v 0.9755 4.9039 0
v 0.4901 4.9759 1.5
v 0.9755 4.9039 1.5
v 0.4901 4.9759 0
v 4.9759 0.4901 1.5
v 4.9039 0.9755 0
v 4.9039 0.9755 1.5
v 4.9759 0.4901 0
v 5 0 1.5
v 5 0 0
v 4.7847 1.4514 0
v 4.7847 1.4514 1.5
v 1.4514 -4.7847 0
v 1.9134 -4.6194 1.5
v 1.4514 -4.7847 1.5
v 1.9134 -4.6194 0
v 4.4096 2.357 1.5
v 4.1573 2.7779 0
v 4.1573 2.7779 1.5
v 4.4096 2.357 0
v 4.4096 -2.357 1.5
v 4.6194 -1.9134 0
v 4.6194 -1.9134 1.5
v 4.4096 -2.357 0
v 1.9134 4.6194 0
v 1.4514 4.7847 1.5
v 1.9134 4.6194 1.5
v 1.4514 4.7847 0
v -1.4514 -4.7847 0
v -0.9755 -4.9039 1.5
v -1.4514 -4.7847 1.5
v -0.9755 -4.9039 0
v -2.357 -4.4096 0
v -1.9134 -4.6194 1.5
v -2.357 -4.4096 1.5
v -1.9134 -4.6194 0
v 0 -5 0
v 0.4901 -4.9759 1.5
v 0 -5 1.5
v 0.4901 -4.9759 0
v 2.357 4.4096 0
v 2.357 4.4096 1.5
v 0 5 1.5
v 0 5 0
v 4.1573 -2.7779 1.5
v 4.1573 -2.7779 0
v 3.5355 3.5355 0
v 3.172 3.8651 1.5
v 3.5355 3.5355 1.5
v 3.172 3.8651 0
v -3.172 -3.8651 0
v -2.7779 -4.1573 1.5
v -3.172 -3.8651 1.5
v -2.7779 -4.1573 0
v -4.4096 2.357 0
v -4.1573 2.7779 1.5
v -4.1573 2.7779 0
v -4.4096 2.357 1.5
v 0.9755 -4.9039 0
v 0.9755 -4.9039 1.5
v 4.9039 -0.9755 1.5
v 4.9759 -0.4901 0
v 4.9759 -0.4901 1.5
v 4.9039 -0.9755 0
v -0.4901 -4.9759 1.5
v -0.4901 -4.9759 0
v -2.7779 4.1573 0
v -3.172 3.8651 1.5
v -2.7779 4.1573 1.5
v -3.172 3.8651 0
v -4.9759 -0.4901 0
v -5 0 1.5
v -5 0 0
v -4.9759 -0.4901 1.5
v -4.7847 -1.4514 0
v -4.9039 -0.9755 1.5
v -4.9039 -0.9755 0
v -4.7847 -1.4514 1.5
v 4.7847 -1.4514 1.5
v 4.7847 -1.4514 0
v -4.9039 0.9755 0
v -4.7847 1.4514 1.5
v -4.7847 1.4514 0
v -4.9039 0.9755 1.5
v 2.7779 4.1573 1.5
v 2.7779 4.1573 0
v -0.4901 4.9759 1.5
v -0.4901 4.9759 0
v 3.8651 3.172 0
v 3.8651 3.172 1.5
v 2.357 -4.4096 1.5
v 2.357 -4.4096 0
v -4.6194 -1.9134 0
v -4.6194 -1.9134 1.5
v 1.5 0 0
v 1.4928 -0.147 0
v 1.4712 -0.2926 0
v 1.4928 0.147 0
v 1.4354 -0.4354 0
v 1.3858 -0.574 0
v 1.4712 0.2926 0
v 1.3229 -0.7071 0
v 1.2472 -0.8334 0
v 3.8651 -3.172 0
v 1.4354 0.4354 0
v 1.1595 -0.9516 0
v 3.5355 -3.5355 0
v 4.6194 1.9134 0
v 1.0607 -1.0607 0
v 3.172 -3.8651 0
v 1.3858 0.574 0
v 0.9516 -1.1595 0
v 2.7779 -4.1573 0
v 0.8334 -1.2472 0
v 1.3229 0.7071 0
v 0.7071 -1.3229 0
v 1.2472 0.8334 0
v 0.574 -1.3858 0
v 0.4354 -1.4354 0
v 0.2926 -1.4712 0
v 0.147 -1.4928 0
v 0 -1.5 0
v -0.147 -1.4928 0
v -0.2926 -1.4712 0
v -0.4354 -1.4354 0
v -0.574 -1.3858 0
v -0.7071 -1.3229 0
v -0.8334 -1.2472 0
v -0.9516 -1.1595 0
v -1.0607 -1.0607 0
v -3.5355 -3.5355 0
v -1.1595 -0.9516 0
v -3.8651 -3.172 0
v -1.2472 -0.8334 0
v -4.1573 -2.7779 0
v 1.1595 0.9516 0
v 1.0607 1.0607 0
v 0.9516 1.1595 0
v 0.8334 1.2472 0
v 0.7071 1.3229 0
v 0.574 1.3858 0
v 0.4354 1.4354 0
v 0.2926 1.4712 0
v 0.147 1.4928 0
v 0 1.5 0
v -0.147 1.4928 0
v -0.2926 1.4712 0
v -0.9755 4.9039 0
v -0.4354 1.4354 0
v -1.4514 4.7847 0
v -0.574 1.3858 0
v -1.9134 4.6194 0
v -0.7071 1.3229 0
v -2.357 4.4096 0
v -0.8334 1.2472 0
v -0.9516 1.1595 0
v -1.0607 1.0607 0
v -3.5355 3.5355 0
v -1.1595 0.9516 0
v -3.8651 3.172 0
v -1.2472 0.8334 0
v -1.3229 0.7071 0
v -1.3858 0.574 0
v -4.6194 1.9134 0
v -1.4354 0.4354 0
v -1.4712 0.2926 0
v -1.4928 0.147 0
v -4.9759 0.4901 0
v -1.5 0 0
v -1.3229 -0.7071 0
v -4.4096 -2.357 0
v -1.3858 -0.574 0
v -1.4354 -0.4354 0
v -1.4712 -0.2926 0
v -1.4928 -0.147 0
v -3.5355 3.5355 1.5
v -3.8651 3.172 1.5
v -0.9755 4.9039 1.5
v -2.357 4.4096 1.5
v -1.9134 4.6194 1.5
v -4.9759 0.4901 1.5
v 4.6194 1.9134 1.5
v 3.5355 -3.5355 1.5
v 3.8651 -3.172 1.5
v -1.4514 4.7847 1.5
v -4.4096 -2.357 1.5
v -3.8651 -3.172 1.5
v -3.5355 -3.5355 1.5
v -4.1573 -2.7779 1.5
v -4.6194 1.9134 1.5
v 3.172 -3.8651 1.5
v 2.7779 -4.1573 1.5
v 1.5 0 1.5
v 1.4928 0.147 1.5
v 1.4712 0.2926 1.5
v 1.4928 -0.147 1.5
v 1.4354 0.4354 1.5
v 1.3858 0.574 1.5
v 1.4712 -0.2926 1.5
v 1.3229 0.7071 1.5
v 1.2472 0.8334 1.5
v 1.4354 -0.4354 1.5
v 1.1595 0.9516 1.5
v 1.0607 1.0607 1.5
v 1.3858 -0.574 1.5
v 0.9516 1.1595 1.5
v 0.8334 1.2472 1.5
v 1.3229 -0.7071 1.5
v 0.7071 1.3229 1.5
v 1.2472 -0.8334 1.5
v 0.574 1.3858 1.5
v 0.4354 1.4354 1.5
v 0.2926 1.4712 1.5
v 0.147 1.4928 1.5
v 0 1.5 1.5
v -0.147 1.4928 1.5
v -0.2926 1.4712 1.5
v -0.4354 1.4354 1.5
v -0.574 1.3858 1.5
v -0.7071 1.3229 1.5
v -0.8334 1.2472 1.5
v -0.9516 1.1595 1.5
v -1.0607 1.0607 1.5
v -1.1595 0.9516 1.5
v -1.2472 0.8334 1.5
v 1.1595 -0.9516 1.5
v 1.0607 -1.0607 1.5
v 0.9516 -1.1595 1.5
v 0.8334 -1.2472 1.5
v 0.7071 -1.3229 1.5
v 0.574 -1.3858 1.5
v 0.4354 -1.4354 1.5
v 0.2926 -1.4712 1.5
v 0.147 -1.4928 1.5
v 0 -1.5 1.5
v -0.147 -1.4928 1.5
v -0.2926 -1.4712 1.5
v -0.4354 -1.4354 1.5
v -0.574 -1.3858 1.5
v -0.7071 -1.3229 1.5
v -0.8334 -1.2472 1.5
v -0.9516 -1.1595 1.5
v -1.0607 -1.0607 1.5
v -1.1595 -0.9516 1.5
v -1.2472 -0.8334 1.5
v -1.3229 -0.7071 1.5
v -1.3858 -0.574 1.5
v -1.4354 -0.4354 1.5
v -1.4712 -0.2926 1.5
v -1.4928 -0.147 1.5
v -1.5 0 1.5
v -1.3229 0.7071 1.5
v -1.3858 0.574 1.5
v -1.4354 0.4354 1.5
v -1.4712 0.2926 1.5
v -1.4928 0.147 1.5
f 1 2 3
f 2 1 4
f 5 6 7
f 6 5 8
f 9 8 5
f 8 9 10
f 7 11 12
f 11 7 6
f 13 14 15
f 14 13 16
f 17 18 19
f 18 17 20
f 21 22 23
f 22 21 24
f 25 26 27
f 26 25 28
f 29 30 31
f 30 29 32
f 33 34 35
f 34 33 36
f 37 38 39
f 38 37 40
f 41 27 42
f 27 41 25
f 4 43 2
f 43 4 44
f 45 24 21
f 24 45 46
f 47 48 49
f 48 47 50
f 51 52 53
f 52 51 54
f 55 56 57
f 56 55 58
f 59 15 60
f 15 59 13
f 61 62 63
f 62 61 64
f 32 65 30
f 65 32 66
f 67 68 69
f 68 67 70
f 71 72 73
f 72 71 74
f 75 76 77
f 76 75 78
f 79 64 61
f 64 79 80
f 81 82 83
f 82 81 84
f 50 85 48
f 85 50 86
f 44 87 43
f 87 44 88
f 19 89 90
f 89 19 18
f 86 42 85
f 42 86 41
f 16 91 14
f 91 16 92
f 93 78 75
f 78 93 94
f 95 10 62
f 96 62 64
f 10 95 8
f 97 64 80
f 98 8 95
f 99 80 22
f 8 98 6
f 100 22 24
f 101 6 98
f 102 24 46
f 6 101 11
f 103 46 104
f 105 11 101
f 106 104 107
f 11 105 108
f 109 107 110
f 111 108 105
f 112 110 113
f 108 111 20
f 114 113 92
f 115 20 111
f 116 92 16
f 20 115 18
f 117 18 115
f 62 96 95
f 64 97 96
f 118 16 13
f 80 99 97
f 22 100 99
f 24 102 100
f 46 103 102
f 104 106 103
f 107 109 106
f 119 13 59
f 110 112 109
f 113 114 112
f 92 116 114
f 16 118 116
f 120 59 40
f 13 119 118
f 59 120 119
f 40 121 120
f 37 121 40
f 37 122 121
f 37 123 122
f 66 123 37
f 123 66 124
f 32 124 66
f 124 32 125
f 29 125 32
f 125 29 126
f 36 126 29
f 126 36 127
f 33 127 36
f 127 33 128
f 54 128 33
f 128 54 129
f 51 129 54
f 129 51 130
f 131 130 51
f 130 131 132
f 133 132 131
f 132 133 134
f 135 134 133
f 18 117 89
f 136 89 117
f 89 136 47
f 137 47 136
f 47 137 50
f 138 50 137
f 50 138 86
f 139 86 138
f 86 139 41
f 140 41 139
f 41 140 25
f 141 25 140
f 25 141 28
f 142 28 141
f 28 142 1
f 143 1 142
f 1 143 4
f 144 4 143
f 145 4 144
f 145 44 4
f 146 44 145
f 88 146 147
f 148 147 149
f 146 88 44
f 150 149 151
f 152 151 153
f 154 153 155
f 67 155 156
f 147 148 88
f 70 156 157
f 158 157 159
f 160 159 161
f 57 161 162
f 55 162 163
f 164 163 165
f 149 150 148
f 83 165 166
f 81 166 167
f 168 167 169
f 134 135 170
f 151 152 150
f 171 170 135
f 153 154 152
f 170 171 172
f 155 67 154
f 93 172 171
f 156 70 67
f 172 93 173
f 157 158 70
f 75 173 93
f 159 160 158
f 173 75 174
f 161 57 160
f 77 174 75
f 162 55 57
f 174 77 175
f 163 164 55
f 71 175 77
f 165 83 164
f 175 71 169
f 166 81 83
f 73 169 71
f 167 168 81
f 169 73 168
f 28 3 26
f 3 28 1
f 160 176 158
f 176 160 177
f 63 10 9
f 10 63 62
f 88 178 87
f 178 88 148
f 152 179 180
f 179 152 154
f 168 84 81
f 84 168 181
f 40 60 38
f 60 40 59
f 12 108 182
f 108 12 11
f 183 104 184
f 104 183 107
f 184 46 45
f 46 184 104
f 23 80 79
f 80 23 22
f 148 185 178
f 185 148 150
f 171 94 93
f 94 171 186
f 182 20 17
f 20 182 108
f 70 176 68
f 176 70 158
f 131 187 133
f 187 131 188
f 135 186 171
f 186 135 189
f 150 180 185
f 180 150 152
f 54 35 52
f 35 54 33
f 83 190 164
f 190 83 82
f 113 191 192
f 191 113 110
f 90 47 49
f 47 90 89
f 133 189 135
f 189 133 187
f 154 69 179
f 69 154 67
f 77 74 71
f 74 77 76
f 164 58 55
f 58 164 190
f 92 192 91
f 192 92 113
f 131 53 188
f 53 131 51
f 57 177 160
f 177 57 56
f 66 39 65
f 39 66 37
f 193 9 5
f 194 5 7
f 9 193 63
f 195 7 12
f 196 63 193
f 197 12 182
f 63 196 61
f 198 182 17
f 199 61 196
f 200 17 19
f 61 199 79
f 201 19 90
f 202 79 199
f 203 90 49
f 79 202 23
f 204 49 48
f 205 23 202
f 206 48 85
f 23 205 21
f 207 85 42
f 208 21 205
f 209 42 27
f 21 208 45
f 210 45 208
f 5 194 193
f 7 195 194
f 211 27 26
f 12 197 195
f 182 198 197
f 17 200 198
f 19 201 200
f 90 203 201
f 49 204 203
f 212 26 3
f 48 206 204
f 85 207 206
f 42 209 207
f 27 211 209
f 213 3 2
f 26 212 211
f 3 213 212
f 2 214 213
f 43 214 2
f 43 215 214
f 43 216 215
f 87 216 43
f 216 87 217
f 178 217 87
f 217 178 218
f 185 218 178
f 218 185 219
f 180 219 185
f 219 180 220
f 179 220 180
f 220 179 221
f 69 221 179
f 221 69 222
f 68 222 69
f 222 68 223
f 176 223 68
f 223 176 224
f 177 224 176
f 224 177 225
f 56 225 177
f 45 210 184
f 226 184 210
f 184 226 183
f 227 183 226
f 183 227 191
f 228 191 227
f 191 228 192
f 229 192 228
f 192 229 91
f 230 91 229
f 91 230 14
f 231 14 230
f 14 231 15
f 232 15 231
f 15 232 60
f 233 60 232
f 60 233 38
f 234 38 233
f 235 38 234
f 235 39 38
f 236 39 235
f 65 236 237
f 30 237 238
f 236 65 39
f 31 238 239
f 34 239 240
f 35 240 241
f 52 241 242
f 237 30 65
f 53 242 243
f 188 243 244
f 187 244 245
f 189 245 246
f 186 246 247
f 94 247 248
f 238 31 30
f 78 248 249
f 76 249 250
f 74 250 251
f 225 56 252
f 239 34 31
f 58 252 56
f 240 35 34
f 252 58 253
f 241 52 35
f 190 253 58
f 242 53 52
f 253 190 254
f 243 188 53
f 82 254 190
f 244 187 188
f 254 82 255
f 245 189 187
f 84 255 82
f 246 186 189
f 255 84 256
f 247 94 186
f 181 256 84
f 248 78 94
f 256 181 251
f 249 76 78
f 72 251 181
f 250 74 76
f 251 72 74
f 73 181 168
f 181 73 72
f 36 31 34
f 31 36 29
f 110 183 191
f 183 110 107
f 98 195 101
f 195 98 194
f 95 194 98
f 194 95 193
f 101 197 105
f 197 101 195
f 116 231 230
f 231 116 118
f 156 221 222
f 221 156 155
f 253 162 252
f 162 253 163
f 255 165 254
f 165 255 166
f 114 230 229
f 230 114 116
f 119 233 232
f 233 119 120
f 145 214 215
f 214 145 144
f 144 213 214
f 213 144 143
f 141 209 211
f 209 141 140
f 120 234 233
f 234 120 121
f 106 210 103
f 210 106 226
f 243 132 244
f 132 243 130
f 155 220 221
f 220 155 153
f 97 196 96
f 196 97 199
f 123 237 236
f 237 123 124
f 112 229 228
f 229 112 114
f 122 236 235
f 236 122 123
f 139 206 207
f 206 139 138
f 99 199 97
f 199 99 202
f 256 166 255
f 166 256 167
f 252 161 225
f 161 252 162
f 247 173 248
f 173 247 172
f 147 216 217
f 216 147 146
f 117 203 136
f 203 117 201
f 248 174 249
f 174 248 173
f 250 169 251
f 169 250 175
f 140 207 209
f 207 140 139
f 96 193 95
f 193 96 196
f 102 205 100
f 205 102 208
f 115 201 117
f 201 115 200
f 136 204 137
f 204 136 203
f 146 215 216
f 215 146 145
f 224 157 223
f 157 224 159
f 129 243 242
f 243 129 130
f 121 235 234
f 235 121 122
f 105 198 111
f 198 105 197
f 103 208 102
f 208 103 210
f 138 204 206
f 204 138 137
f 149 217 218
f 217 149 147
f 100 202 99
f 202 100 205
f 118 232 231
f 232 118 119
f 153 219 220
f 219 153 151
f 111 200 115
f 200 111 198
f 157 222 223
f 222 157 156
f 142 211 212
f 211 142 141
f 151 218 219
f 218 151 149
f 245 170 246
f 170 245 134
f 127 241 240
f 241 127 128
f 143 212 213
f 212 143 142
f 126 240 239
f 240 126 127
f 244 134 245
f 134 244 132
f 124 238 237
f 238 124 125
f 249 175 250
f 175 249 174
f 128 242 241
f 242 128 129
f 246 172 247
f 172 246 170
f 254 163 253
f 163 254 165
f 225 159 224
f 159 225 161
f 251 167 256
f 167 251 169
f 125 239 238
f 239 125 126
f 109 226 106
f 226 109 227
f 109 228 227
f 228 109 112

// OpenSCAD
difference() {
    cylinder(h=1.5, d=10.0, $fn=64);
    translate([0, 0, -0.1])
        cylinder(h=1.7, d=3.0, $fn=64);
}
